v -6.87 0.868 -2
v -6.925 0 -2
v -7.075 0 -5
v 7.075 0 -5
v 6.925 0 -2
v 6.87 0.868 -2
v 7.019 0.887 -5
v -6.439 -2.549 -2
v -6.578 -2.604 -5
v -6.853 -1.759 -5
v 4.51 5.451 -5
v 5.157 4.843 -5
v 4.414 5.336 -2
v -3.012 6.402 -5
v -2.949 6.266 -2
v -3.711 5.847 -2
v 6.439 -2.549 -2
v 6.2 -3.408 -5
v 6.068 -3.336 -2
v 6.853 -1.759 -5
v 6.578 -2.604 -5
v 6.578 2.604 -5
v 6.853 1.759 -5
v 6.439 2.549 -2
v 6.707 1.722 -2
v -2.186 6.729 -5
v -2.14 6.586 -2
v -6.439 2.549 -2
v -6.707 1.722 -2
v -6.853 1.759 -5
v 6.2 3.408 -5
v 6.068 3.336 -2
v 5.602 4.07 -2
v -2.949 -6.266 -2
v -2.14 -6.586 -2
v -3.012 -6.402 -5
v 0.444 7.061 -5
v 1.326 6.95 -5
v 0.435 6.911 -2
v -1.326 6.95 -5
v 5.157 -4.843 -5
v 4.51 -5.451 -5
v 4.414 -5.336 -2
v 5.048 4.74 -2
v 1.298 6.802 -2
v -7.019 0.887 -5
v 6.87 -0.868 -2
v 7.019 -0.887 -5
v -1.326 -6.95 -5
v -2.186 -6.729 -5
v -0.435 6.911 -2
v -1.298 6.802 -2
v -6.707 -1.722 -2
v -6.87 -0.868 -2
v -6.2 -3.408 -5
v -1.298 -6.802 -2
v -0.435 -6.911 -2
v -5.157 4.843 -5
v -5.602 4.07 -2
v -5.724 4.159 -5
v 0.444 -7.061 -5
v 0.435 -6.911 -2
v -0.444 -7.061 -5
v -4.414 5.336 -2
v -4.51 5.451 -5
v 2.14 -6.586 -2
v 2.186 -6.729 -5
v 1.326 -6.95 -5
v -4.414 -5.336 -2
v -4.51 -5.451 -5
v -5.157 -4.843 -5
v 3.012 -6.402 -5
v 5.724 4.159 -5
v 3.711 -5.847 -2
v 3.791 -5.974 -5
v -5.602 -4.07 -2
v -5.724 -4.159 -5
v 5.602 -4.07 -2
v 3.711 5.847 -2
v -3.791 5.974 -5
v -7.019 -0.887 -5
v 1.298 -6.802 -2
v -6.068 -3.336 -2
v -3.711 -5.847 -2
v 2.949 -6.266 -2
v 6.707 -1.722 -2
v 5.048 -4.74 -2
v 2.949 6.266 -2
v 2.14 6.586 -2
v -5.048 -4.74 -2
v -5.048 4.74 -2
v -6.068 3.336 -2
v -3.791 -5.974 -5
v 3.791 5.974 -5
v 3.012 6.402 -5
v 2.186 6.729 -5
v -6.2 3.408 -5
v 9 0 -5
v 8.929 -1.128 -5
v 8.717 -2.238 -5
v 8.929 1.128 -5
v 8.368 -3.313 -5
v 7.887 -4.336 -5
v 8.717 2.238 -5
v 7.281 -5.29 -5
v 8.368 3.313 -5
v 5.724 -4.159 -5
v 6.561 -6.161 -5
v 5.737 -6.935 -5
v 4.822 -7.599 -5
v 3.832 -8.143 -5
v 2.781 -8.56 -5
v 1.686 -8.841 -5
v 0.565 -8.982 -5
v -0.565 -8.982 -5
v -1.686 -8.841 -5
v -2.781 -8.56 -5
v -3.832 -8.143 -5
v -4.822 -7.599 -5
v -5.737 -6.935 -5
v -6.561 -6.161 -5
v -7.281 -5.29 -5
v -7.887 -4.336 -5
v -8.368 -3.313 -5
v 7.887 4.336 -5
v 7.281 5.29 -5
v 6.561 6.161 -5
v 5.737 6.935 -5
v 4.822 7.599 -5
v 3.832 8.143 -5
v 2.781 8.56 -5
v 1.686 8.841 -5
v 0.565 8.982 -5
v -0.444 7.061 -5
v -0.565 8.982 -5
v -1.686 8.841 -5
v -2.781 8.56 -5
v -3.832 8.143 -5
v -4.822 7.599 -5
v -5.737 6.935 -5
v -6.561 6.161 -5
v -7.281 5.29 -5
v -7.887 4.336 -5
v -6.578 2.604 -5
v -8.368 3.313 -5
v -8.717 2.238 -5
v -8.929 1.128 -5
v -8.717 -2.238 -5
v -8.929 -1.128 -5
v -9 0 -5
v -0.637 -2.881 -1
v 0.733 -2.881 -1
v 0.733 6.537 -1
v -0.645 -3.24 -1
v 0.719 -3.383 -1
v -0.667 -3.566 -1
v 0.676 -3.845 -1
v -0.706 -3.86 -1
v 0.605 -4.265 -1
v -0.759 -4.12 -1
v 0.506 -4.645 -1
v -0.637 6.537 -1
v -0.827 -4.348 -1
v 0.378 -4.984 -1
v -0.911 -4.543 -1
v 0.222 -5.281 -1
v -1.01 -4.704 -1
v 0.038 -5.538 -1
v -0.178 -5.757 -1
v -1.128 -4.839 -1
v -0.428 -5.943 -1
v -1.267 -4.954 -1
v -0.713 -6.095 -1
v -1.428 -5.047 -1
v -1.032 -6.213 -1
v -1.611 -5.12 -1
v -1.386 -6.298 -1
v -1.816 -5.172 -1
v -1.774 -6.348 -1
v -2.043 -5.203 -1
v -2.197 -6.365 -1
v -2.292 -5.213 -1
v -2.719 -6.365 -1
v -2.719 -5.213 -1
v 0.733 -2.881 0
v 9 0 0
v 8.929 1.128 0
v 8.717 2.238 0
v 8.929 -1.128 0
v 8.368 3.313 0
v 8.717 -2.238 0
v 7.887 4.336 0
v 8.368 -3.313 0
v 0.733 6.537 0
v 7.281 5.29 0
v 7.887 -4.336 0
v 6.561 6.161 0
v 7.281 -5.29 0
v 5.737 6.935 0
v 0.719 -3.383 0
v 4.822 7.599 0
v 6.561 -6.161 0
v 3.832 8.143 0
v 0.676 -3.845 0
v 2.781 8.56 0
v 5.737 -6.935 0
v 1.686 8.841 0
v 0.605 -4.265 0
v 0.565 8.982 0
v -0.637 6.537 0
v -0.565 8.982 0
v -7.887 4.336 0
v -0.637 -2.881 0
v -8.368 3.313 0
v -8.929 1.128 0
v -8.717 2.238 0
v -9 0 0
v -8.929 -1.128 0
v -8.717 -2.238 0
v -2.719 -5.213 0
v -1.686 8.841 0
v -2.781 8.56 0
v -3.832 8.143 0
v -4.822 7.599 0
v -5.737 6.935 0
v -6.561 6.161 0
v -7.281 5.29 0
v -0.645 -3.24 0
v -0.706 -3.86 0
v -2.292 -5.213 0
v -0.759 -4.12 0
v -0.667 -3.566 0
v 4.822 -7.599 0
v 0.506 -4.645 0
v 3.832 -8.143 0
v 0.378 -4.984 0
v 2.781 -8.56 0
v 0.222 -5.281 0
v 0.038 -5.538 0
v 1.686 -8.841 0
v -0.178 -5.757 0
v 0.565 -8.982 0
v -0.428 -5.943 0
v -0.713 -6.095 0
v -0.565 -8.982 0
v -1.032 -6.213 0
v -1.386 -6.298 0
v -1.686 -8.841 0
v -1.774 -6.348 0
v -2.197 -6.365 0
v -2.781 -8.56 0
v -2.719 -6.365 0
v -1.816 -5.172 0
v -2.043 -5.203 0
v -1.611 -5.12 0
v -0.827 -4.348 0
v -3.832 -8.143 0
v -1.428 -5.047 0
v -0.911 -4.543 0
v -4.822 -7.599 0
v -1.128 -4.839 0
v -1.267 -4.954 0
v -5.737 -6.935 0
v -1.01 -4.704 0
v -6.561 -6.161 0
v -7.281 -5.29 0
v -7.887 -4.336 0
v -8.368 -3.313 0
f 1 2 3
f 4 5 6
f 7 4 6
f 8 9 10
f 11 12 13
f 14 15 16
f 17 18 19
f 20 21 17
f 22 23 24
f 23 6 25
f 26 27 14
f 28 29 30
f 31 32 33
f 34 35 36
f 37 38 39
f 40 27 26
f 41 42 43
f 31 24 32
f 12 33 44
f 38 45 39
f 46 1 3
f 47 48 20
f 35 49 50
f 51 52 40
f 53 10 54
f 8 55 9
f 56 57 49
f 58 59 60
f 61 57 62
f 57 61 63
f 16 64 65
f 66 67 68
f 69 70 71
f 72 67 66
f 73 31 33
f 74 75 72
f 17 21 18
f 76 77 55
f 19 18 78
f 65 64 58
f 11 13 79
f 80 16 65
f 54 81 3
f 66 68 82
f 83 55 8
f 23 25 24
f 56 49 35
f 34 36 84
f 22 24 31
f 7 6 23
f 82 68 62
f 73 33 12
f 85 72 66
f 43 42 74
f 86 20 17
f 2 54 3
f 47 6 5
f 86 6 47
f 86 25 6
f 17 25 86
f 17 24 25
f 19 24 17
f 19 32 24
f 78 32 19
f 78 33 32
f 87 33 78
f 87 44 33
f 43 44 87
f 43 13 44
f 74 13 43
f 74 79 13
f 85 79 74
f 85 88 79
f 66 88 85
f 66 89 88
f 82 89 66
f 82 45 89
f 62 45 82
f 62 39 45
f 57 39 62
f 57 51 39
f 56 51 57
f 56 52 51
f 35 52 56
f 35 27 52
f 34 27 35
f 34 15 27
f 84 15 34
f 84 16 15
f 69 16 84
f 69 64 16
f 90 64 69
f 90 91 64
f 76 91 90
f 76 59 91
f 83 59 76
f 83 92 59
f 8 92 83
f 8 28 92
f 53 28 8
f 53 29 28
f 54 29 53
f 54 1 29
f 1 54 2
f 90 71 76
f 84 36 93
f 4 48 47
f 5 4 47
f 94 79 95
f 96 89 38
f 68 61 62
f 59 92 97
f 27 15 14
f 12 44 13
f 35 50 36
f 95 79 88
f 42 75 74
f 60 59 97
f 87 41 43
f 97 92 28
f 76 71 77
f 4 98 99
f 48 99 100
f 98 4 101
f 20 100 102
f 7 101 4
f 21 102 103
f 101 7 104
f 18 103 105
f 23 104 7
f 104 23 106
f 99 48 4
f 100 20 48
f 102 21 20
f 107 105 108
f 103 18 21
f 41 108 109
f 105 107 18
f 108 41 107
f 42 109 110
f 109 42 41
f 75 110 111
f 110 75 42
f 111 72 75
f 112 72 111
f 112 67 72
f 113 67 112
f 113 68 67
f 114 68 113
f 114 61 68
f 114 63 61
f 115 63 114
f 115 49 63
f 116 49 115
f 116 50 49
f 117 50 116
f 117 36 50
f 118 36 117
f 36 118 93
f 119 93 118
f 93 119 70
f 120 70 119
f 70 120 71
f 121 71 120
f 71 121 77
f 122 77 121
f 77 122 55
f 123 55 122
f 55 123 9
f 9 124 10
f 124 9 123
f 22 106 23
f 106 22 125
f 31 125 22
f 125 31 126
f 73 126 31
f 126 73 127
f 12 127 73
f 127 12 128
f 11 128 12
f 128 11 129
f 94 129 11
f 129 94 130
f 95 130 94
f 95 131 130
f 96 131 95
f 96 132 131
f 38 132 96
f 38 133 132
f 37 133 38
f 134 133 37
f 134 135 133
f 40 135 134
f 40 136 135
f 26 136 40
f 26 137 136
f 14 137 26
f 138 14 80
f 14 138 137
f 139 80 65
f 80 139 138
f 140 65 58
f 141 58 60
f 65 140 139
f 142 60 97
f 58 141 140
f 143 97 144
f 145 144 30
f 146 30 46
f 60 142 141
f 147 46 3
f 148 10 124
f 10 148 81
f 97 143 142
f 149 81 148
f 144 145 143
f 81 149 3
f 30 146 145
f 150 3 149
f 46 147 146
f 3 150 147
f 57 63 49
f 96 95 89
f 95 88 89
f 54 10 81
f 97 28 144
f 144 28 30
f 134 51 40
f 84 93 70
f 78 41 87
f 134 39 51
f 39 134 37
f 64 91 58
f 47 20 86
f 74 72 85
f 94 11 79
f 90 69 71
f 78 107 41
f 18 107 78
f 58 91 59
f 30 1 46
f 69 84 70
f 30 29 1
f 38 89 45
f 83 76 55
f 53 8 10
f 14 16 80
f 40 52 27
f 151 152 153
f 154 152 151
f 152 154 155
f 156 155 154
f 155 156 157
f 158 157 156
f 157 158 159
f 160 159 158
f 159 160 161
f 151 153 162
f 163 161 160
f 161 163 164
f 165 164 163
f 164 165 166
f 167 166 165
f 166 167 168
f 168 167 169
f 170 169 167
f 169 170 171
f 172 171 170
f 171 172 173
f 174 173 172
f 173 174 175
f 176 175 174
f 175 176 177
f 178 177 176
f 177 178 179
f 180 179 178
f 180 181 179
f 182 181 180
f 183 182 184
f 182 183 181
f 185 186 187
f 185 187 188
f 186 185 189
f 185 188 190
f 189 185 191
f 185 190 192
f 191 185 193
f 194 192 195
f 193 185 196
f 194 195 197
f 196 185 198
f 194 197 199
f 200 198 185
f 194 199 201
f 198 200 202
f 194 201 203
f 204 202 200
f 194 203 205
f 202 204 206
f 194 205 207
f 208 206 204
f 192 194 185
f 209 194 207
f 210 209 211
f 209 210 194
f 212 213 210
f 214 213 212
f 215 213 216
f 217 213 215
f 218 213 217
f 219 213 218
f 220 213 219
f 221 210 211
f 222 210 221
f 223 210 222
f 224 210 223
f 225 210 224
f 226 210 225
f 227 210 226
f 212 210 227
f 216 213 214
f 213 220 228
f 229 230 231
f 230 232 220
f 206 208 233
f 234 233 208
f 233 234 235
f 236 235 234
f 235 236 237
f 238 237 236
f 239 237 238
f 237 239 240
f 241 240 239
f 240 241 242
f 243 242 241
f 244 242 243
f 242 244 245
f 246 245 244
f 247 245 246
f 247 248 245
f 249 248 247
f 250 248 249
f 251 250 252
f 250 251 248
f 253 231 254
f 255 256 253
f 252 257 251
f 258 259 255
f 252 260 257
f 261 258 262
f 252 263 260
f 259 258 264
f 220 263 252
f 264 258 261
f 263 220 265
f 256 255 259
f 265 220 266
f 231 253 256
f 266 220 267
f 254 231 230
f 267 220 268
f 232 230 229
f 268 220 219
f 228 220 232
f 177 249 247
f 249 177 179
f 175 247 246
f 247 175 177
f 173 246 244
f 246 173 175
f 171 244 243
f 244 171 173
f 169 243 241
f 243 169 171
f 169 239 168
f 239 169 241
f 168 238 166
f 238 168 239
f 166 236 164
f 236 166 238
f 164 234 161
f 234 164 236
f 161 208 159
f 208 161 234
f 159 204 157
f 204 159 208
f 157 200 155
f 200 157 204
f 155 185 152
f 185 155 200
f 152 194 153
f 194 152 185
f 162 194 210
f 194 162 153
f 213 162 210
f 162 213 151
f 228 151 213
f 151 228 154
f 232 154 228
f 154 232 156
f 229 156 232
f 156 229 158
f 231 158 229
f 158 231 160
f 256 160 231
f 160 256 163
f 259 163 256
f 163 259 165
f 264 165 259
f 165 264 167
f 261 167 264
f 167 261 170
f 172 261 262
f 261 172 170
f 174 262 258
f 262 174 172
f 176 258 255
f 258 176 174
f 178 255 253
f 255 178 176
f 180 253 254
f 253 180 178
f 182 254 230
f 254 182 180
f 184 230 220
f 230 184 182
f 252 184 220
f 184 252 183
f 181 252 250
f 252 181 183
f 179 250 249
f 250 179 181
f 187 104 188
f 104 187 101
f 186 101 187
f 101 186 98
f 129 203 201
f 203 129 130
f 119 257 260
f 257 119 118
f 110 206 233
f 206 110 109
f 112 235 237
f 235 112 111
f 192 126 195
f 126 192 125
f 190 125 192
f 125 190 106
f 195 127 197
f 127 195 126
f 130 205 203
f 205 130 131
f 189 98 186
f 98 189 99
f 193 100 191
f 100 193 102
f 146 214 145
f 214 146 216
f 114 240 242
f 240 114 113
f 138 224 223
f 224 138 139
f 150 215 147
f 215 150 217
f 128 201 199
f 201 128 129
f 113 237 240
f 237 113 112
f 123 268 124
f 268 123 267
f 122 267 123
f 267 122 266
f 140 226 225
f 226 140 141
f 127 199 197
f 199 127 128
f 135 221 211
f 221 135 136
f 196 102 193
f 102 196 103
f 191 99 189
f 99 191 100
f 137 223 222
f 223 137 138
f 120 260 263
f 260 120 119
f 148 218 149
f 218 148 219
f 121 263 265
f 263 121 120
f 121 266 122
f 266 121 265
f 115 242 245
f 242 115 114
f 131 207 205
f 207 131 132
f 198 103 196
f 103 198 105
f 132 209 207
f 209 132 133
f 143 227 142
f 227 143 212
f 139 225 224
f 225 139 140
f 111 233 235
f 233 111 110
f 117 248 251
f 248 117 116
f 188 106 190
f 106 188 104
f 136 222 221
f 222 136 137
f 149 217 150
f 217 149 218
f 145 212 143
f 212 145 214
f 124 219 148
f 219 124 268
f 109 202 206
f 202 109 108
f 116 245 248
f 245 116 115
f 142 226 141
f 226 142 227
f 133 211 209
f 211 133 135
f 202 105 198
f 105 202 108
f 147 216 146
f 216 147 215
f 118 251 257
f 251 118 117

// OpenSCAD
$fn = 50;


difference() {
	union() {
		translate(v = [0, 0, -5.0000000000]) {
			cylinder(h = 5, r = 9.0000000000);
		}
	}
	union() {
		#translate(v = [0, 0, -5.0000000000]) {
			cylinder(h = 3, r1 = 7.0750000000, r2 = 6.9250000000);
		}
		translate(v = [0, 0, -1]) {
			linear_extrude(height = 1) {
				text(font = "Impact", halign = "center", size = 10, text = "J", valign = "center");
			}
		}
	}
}
